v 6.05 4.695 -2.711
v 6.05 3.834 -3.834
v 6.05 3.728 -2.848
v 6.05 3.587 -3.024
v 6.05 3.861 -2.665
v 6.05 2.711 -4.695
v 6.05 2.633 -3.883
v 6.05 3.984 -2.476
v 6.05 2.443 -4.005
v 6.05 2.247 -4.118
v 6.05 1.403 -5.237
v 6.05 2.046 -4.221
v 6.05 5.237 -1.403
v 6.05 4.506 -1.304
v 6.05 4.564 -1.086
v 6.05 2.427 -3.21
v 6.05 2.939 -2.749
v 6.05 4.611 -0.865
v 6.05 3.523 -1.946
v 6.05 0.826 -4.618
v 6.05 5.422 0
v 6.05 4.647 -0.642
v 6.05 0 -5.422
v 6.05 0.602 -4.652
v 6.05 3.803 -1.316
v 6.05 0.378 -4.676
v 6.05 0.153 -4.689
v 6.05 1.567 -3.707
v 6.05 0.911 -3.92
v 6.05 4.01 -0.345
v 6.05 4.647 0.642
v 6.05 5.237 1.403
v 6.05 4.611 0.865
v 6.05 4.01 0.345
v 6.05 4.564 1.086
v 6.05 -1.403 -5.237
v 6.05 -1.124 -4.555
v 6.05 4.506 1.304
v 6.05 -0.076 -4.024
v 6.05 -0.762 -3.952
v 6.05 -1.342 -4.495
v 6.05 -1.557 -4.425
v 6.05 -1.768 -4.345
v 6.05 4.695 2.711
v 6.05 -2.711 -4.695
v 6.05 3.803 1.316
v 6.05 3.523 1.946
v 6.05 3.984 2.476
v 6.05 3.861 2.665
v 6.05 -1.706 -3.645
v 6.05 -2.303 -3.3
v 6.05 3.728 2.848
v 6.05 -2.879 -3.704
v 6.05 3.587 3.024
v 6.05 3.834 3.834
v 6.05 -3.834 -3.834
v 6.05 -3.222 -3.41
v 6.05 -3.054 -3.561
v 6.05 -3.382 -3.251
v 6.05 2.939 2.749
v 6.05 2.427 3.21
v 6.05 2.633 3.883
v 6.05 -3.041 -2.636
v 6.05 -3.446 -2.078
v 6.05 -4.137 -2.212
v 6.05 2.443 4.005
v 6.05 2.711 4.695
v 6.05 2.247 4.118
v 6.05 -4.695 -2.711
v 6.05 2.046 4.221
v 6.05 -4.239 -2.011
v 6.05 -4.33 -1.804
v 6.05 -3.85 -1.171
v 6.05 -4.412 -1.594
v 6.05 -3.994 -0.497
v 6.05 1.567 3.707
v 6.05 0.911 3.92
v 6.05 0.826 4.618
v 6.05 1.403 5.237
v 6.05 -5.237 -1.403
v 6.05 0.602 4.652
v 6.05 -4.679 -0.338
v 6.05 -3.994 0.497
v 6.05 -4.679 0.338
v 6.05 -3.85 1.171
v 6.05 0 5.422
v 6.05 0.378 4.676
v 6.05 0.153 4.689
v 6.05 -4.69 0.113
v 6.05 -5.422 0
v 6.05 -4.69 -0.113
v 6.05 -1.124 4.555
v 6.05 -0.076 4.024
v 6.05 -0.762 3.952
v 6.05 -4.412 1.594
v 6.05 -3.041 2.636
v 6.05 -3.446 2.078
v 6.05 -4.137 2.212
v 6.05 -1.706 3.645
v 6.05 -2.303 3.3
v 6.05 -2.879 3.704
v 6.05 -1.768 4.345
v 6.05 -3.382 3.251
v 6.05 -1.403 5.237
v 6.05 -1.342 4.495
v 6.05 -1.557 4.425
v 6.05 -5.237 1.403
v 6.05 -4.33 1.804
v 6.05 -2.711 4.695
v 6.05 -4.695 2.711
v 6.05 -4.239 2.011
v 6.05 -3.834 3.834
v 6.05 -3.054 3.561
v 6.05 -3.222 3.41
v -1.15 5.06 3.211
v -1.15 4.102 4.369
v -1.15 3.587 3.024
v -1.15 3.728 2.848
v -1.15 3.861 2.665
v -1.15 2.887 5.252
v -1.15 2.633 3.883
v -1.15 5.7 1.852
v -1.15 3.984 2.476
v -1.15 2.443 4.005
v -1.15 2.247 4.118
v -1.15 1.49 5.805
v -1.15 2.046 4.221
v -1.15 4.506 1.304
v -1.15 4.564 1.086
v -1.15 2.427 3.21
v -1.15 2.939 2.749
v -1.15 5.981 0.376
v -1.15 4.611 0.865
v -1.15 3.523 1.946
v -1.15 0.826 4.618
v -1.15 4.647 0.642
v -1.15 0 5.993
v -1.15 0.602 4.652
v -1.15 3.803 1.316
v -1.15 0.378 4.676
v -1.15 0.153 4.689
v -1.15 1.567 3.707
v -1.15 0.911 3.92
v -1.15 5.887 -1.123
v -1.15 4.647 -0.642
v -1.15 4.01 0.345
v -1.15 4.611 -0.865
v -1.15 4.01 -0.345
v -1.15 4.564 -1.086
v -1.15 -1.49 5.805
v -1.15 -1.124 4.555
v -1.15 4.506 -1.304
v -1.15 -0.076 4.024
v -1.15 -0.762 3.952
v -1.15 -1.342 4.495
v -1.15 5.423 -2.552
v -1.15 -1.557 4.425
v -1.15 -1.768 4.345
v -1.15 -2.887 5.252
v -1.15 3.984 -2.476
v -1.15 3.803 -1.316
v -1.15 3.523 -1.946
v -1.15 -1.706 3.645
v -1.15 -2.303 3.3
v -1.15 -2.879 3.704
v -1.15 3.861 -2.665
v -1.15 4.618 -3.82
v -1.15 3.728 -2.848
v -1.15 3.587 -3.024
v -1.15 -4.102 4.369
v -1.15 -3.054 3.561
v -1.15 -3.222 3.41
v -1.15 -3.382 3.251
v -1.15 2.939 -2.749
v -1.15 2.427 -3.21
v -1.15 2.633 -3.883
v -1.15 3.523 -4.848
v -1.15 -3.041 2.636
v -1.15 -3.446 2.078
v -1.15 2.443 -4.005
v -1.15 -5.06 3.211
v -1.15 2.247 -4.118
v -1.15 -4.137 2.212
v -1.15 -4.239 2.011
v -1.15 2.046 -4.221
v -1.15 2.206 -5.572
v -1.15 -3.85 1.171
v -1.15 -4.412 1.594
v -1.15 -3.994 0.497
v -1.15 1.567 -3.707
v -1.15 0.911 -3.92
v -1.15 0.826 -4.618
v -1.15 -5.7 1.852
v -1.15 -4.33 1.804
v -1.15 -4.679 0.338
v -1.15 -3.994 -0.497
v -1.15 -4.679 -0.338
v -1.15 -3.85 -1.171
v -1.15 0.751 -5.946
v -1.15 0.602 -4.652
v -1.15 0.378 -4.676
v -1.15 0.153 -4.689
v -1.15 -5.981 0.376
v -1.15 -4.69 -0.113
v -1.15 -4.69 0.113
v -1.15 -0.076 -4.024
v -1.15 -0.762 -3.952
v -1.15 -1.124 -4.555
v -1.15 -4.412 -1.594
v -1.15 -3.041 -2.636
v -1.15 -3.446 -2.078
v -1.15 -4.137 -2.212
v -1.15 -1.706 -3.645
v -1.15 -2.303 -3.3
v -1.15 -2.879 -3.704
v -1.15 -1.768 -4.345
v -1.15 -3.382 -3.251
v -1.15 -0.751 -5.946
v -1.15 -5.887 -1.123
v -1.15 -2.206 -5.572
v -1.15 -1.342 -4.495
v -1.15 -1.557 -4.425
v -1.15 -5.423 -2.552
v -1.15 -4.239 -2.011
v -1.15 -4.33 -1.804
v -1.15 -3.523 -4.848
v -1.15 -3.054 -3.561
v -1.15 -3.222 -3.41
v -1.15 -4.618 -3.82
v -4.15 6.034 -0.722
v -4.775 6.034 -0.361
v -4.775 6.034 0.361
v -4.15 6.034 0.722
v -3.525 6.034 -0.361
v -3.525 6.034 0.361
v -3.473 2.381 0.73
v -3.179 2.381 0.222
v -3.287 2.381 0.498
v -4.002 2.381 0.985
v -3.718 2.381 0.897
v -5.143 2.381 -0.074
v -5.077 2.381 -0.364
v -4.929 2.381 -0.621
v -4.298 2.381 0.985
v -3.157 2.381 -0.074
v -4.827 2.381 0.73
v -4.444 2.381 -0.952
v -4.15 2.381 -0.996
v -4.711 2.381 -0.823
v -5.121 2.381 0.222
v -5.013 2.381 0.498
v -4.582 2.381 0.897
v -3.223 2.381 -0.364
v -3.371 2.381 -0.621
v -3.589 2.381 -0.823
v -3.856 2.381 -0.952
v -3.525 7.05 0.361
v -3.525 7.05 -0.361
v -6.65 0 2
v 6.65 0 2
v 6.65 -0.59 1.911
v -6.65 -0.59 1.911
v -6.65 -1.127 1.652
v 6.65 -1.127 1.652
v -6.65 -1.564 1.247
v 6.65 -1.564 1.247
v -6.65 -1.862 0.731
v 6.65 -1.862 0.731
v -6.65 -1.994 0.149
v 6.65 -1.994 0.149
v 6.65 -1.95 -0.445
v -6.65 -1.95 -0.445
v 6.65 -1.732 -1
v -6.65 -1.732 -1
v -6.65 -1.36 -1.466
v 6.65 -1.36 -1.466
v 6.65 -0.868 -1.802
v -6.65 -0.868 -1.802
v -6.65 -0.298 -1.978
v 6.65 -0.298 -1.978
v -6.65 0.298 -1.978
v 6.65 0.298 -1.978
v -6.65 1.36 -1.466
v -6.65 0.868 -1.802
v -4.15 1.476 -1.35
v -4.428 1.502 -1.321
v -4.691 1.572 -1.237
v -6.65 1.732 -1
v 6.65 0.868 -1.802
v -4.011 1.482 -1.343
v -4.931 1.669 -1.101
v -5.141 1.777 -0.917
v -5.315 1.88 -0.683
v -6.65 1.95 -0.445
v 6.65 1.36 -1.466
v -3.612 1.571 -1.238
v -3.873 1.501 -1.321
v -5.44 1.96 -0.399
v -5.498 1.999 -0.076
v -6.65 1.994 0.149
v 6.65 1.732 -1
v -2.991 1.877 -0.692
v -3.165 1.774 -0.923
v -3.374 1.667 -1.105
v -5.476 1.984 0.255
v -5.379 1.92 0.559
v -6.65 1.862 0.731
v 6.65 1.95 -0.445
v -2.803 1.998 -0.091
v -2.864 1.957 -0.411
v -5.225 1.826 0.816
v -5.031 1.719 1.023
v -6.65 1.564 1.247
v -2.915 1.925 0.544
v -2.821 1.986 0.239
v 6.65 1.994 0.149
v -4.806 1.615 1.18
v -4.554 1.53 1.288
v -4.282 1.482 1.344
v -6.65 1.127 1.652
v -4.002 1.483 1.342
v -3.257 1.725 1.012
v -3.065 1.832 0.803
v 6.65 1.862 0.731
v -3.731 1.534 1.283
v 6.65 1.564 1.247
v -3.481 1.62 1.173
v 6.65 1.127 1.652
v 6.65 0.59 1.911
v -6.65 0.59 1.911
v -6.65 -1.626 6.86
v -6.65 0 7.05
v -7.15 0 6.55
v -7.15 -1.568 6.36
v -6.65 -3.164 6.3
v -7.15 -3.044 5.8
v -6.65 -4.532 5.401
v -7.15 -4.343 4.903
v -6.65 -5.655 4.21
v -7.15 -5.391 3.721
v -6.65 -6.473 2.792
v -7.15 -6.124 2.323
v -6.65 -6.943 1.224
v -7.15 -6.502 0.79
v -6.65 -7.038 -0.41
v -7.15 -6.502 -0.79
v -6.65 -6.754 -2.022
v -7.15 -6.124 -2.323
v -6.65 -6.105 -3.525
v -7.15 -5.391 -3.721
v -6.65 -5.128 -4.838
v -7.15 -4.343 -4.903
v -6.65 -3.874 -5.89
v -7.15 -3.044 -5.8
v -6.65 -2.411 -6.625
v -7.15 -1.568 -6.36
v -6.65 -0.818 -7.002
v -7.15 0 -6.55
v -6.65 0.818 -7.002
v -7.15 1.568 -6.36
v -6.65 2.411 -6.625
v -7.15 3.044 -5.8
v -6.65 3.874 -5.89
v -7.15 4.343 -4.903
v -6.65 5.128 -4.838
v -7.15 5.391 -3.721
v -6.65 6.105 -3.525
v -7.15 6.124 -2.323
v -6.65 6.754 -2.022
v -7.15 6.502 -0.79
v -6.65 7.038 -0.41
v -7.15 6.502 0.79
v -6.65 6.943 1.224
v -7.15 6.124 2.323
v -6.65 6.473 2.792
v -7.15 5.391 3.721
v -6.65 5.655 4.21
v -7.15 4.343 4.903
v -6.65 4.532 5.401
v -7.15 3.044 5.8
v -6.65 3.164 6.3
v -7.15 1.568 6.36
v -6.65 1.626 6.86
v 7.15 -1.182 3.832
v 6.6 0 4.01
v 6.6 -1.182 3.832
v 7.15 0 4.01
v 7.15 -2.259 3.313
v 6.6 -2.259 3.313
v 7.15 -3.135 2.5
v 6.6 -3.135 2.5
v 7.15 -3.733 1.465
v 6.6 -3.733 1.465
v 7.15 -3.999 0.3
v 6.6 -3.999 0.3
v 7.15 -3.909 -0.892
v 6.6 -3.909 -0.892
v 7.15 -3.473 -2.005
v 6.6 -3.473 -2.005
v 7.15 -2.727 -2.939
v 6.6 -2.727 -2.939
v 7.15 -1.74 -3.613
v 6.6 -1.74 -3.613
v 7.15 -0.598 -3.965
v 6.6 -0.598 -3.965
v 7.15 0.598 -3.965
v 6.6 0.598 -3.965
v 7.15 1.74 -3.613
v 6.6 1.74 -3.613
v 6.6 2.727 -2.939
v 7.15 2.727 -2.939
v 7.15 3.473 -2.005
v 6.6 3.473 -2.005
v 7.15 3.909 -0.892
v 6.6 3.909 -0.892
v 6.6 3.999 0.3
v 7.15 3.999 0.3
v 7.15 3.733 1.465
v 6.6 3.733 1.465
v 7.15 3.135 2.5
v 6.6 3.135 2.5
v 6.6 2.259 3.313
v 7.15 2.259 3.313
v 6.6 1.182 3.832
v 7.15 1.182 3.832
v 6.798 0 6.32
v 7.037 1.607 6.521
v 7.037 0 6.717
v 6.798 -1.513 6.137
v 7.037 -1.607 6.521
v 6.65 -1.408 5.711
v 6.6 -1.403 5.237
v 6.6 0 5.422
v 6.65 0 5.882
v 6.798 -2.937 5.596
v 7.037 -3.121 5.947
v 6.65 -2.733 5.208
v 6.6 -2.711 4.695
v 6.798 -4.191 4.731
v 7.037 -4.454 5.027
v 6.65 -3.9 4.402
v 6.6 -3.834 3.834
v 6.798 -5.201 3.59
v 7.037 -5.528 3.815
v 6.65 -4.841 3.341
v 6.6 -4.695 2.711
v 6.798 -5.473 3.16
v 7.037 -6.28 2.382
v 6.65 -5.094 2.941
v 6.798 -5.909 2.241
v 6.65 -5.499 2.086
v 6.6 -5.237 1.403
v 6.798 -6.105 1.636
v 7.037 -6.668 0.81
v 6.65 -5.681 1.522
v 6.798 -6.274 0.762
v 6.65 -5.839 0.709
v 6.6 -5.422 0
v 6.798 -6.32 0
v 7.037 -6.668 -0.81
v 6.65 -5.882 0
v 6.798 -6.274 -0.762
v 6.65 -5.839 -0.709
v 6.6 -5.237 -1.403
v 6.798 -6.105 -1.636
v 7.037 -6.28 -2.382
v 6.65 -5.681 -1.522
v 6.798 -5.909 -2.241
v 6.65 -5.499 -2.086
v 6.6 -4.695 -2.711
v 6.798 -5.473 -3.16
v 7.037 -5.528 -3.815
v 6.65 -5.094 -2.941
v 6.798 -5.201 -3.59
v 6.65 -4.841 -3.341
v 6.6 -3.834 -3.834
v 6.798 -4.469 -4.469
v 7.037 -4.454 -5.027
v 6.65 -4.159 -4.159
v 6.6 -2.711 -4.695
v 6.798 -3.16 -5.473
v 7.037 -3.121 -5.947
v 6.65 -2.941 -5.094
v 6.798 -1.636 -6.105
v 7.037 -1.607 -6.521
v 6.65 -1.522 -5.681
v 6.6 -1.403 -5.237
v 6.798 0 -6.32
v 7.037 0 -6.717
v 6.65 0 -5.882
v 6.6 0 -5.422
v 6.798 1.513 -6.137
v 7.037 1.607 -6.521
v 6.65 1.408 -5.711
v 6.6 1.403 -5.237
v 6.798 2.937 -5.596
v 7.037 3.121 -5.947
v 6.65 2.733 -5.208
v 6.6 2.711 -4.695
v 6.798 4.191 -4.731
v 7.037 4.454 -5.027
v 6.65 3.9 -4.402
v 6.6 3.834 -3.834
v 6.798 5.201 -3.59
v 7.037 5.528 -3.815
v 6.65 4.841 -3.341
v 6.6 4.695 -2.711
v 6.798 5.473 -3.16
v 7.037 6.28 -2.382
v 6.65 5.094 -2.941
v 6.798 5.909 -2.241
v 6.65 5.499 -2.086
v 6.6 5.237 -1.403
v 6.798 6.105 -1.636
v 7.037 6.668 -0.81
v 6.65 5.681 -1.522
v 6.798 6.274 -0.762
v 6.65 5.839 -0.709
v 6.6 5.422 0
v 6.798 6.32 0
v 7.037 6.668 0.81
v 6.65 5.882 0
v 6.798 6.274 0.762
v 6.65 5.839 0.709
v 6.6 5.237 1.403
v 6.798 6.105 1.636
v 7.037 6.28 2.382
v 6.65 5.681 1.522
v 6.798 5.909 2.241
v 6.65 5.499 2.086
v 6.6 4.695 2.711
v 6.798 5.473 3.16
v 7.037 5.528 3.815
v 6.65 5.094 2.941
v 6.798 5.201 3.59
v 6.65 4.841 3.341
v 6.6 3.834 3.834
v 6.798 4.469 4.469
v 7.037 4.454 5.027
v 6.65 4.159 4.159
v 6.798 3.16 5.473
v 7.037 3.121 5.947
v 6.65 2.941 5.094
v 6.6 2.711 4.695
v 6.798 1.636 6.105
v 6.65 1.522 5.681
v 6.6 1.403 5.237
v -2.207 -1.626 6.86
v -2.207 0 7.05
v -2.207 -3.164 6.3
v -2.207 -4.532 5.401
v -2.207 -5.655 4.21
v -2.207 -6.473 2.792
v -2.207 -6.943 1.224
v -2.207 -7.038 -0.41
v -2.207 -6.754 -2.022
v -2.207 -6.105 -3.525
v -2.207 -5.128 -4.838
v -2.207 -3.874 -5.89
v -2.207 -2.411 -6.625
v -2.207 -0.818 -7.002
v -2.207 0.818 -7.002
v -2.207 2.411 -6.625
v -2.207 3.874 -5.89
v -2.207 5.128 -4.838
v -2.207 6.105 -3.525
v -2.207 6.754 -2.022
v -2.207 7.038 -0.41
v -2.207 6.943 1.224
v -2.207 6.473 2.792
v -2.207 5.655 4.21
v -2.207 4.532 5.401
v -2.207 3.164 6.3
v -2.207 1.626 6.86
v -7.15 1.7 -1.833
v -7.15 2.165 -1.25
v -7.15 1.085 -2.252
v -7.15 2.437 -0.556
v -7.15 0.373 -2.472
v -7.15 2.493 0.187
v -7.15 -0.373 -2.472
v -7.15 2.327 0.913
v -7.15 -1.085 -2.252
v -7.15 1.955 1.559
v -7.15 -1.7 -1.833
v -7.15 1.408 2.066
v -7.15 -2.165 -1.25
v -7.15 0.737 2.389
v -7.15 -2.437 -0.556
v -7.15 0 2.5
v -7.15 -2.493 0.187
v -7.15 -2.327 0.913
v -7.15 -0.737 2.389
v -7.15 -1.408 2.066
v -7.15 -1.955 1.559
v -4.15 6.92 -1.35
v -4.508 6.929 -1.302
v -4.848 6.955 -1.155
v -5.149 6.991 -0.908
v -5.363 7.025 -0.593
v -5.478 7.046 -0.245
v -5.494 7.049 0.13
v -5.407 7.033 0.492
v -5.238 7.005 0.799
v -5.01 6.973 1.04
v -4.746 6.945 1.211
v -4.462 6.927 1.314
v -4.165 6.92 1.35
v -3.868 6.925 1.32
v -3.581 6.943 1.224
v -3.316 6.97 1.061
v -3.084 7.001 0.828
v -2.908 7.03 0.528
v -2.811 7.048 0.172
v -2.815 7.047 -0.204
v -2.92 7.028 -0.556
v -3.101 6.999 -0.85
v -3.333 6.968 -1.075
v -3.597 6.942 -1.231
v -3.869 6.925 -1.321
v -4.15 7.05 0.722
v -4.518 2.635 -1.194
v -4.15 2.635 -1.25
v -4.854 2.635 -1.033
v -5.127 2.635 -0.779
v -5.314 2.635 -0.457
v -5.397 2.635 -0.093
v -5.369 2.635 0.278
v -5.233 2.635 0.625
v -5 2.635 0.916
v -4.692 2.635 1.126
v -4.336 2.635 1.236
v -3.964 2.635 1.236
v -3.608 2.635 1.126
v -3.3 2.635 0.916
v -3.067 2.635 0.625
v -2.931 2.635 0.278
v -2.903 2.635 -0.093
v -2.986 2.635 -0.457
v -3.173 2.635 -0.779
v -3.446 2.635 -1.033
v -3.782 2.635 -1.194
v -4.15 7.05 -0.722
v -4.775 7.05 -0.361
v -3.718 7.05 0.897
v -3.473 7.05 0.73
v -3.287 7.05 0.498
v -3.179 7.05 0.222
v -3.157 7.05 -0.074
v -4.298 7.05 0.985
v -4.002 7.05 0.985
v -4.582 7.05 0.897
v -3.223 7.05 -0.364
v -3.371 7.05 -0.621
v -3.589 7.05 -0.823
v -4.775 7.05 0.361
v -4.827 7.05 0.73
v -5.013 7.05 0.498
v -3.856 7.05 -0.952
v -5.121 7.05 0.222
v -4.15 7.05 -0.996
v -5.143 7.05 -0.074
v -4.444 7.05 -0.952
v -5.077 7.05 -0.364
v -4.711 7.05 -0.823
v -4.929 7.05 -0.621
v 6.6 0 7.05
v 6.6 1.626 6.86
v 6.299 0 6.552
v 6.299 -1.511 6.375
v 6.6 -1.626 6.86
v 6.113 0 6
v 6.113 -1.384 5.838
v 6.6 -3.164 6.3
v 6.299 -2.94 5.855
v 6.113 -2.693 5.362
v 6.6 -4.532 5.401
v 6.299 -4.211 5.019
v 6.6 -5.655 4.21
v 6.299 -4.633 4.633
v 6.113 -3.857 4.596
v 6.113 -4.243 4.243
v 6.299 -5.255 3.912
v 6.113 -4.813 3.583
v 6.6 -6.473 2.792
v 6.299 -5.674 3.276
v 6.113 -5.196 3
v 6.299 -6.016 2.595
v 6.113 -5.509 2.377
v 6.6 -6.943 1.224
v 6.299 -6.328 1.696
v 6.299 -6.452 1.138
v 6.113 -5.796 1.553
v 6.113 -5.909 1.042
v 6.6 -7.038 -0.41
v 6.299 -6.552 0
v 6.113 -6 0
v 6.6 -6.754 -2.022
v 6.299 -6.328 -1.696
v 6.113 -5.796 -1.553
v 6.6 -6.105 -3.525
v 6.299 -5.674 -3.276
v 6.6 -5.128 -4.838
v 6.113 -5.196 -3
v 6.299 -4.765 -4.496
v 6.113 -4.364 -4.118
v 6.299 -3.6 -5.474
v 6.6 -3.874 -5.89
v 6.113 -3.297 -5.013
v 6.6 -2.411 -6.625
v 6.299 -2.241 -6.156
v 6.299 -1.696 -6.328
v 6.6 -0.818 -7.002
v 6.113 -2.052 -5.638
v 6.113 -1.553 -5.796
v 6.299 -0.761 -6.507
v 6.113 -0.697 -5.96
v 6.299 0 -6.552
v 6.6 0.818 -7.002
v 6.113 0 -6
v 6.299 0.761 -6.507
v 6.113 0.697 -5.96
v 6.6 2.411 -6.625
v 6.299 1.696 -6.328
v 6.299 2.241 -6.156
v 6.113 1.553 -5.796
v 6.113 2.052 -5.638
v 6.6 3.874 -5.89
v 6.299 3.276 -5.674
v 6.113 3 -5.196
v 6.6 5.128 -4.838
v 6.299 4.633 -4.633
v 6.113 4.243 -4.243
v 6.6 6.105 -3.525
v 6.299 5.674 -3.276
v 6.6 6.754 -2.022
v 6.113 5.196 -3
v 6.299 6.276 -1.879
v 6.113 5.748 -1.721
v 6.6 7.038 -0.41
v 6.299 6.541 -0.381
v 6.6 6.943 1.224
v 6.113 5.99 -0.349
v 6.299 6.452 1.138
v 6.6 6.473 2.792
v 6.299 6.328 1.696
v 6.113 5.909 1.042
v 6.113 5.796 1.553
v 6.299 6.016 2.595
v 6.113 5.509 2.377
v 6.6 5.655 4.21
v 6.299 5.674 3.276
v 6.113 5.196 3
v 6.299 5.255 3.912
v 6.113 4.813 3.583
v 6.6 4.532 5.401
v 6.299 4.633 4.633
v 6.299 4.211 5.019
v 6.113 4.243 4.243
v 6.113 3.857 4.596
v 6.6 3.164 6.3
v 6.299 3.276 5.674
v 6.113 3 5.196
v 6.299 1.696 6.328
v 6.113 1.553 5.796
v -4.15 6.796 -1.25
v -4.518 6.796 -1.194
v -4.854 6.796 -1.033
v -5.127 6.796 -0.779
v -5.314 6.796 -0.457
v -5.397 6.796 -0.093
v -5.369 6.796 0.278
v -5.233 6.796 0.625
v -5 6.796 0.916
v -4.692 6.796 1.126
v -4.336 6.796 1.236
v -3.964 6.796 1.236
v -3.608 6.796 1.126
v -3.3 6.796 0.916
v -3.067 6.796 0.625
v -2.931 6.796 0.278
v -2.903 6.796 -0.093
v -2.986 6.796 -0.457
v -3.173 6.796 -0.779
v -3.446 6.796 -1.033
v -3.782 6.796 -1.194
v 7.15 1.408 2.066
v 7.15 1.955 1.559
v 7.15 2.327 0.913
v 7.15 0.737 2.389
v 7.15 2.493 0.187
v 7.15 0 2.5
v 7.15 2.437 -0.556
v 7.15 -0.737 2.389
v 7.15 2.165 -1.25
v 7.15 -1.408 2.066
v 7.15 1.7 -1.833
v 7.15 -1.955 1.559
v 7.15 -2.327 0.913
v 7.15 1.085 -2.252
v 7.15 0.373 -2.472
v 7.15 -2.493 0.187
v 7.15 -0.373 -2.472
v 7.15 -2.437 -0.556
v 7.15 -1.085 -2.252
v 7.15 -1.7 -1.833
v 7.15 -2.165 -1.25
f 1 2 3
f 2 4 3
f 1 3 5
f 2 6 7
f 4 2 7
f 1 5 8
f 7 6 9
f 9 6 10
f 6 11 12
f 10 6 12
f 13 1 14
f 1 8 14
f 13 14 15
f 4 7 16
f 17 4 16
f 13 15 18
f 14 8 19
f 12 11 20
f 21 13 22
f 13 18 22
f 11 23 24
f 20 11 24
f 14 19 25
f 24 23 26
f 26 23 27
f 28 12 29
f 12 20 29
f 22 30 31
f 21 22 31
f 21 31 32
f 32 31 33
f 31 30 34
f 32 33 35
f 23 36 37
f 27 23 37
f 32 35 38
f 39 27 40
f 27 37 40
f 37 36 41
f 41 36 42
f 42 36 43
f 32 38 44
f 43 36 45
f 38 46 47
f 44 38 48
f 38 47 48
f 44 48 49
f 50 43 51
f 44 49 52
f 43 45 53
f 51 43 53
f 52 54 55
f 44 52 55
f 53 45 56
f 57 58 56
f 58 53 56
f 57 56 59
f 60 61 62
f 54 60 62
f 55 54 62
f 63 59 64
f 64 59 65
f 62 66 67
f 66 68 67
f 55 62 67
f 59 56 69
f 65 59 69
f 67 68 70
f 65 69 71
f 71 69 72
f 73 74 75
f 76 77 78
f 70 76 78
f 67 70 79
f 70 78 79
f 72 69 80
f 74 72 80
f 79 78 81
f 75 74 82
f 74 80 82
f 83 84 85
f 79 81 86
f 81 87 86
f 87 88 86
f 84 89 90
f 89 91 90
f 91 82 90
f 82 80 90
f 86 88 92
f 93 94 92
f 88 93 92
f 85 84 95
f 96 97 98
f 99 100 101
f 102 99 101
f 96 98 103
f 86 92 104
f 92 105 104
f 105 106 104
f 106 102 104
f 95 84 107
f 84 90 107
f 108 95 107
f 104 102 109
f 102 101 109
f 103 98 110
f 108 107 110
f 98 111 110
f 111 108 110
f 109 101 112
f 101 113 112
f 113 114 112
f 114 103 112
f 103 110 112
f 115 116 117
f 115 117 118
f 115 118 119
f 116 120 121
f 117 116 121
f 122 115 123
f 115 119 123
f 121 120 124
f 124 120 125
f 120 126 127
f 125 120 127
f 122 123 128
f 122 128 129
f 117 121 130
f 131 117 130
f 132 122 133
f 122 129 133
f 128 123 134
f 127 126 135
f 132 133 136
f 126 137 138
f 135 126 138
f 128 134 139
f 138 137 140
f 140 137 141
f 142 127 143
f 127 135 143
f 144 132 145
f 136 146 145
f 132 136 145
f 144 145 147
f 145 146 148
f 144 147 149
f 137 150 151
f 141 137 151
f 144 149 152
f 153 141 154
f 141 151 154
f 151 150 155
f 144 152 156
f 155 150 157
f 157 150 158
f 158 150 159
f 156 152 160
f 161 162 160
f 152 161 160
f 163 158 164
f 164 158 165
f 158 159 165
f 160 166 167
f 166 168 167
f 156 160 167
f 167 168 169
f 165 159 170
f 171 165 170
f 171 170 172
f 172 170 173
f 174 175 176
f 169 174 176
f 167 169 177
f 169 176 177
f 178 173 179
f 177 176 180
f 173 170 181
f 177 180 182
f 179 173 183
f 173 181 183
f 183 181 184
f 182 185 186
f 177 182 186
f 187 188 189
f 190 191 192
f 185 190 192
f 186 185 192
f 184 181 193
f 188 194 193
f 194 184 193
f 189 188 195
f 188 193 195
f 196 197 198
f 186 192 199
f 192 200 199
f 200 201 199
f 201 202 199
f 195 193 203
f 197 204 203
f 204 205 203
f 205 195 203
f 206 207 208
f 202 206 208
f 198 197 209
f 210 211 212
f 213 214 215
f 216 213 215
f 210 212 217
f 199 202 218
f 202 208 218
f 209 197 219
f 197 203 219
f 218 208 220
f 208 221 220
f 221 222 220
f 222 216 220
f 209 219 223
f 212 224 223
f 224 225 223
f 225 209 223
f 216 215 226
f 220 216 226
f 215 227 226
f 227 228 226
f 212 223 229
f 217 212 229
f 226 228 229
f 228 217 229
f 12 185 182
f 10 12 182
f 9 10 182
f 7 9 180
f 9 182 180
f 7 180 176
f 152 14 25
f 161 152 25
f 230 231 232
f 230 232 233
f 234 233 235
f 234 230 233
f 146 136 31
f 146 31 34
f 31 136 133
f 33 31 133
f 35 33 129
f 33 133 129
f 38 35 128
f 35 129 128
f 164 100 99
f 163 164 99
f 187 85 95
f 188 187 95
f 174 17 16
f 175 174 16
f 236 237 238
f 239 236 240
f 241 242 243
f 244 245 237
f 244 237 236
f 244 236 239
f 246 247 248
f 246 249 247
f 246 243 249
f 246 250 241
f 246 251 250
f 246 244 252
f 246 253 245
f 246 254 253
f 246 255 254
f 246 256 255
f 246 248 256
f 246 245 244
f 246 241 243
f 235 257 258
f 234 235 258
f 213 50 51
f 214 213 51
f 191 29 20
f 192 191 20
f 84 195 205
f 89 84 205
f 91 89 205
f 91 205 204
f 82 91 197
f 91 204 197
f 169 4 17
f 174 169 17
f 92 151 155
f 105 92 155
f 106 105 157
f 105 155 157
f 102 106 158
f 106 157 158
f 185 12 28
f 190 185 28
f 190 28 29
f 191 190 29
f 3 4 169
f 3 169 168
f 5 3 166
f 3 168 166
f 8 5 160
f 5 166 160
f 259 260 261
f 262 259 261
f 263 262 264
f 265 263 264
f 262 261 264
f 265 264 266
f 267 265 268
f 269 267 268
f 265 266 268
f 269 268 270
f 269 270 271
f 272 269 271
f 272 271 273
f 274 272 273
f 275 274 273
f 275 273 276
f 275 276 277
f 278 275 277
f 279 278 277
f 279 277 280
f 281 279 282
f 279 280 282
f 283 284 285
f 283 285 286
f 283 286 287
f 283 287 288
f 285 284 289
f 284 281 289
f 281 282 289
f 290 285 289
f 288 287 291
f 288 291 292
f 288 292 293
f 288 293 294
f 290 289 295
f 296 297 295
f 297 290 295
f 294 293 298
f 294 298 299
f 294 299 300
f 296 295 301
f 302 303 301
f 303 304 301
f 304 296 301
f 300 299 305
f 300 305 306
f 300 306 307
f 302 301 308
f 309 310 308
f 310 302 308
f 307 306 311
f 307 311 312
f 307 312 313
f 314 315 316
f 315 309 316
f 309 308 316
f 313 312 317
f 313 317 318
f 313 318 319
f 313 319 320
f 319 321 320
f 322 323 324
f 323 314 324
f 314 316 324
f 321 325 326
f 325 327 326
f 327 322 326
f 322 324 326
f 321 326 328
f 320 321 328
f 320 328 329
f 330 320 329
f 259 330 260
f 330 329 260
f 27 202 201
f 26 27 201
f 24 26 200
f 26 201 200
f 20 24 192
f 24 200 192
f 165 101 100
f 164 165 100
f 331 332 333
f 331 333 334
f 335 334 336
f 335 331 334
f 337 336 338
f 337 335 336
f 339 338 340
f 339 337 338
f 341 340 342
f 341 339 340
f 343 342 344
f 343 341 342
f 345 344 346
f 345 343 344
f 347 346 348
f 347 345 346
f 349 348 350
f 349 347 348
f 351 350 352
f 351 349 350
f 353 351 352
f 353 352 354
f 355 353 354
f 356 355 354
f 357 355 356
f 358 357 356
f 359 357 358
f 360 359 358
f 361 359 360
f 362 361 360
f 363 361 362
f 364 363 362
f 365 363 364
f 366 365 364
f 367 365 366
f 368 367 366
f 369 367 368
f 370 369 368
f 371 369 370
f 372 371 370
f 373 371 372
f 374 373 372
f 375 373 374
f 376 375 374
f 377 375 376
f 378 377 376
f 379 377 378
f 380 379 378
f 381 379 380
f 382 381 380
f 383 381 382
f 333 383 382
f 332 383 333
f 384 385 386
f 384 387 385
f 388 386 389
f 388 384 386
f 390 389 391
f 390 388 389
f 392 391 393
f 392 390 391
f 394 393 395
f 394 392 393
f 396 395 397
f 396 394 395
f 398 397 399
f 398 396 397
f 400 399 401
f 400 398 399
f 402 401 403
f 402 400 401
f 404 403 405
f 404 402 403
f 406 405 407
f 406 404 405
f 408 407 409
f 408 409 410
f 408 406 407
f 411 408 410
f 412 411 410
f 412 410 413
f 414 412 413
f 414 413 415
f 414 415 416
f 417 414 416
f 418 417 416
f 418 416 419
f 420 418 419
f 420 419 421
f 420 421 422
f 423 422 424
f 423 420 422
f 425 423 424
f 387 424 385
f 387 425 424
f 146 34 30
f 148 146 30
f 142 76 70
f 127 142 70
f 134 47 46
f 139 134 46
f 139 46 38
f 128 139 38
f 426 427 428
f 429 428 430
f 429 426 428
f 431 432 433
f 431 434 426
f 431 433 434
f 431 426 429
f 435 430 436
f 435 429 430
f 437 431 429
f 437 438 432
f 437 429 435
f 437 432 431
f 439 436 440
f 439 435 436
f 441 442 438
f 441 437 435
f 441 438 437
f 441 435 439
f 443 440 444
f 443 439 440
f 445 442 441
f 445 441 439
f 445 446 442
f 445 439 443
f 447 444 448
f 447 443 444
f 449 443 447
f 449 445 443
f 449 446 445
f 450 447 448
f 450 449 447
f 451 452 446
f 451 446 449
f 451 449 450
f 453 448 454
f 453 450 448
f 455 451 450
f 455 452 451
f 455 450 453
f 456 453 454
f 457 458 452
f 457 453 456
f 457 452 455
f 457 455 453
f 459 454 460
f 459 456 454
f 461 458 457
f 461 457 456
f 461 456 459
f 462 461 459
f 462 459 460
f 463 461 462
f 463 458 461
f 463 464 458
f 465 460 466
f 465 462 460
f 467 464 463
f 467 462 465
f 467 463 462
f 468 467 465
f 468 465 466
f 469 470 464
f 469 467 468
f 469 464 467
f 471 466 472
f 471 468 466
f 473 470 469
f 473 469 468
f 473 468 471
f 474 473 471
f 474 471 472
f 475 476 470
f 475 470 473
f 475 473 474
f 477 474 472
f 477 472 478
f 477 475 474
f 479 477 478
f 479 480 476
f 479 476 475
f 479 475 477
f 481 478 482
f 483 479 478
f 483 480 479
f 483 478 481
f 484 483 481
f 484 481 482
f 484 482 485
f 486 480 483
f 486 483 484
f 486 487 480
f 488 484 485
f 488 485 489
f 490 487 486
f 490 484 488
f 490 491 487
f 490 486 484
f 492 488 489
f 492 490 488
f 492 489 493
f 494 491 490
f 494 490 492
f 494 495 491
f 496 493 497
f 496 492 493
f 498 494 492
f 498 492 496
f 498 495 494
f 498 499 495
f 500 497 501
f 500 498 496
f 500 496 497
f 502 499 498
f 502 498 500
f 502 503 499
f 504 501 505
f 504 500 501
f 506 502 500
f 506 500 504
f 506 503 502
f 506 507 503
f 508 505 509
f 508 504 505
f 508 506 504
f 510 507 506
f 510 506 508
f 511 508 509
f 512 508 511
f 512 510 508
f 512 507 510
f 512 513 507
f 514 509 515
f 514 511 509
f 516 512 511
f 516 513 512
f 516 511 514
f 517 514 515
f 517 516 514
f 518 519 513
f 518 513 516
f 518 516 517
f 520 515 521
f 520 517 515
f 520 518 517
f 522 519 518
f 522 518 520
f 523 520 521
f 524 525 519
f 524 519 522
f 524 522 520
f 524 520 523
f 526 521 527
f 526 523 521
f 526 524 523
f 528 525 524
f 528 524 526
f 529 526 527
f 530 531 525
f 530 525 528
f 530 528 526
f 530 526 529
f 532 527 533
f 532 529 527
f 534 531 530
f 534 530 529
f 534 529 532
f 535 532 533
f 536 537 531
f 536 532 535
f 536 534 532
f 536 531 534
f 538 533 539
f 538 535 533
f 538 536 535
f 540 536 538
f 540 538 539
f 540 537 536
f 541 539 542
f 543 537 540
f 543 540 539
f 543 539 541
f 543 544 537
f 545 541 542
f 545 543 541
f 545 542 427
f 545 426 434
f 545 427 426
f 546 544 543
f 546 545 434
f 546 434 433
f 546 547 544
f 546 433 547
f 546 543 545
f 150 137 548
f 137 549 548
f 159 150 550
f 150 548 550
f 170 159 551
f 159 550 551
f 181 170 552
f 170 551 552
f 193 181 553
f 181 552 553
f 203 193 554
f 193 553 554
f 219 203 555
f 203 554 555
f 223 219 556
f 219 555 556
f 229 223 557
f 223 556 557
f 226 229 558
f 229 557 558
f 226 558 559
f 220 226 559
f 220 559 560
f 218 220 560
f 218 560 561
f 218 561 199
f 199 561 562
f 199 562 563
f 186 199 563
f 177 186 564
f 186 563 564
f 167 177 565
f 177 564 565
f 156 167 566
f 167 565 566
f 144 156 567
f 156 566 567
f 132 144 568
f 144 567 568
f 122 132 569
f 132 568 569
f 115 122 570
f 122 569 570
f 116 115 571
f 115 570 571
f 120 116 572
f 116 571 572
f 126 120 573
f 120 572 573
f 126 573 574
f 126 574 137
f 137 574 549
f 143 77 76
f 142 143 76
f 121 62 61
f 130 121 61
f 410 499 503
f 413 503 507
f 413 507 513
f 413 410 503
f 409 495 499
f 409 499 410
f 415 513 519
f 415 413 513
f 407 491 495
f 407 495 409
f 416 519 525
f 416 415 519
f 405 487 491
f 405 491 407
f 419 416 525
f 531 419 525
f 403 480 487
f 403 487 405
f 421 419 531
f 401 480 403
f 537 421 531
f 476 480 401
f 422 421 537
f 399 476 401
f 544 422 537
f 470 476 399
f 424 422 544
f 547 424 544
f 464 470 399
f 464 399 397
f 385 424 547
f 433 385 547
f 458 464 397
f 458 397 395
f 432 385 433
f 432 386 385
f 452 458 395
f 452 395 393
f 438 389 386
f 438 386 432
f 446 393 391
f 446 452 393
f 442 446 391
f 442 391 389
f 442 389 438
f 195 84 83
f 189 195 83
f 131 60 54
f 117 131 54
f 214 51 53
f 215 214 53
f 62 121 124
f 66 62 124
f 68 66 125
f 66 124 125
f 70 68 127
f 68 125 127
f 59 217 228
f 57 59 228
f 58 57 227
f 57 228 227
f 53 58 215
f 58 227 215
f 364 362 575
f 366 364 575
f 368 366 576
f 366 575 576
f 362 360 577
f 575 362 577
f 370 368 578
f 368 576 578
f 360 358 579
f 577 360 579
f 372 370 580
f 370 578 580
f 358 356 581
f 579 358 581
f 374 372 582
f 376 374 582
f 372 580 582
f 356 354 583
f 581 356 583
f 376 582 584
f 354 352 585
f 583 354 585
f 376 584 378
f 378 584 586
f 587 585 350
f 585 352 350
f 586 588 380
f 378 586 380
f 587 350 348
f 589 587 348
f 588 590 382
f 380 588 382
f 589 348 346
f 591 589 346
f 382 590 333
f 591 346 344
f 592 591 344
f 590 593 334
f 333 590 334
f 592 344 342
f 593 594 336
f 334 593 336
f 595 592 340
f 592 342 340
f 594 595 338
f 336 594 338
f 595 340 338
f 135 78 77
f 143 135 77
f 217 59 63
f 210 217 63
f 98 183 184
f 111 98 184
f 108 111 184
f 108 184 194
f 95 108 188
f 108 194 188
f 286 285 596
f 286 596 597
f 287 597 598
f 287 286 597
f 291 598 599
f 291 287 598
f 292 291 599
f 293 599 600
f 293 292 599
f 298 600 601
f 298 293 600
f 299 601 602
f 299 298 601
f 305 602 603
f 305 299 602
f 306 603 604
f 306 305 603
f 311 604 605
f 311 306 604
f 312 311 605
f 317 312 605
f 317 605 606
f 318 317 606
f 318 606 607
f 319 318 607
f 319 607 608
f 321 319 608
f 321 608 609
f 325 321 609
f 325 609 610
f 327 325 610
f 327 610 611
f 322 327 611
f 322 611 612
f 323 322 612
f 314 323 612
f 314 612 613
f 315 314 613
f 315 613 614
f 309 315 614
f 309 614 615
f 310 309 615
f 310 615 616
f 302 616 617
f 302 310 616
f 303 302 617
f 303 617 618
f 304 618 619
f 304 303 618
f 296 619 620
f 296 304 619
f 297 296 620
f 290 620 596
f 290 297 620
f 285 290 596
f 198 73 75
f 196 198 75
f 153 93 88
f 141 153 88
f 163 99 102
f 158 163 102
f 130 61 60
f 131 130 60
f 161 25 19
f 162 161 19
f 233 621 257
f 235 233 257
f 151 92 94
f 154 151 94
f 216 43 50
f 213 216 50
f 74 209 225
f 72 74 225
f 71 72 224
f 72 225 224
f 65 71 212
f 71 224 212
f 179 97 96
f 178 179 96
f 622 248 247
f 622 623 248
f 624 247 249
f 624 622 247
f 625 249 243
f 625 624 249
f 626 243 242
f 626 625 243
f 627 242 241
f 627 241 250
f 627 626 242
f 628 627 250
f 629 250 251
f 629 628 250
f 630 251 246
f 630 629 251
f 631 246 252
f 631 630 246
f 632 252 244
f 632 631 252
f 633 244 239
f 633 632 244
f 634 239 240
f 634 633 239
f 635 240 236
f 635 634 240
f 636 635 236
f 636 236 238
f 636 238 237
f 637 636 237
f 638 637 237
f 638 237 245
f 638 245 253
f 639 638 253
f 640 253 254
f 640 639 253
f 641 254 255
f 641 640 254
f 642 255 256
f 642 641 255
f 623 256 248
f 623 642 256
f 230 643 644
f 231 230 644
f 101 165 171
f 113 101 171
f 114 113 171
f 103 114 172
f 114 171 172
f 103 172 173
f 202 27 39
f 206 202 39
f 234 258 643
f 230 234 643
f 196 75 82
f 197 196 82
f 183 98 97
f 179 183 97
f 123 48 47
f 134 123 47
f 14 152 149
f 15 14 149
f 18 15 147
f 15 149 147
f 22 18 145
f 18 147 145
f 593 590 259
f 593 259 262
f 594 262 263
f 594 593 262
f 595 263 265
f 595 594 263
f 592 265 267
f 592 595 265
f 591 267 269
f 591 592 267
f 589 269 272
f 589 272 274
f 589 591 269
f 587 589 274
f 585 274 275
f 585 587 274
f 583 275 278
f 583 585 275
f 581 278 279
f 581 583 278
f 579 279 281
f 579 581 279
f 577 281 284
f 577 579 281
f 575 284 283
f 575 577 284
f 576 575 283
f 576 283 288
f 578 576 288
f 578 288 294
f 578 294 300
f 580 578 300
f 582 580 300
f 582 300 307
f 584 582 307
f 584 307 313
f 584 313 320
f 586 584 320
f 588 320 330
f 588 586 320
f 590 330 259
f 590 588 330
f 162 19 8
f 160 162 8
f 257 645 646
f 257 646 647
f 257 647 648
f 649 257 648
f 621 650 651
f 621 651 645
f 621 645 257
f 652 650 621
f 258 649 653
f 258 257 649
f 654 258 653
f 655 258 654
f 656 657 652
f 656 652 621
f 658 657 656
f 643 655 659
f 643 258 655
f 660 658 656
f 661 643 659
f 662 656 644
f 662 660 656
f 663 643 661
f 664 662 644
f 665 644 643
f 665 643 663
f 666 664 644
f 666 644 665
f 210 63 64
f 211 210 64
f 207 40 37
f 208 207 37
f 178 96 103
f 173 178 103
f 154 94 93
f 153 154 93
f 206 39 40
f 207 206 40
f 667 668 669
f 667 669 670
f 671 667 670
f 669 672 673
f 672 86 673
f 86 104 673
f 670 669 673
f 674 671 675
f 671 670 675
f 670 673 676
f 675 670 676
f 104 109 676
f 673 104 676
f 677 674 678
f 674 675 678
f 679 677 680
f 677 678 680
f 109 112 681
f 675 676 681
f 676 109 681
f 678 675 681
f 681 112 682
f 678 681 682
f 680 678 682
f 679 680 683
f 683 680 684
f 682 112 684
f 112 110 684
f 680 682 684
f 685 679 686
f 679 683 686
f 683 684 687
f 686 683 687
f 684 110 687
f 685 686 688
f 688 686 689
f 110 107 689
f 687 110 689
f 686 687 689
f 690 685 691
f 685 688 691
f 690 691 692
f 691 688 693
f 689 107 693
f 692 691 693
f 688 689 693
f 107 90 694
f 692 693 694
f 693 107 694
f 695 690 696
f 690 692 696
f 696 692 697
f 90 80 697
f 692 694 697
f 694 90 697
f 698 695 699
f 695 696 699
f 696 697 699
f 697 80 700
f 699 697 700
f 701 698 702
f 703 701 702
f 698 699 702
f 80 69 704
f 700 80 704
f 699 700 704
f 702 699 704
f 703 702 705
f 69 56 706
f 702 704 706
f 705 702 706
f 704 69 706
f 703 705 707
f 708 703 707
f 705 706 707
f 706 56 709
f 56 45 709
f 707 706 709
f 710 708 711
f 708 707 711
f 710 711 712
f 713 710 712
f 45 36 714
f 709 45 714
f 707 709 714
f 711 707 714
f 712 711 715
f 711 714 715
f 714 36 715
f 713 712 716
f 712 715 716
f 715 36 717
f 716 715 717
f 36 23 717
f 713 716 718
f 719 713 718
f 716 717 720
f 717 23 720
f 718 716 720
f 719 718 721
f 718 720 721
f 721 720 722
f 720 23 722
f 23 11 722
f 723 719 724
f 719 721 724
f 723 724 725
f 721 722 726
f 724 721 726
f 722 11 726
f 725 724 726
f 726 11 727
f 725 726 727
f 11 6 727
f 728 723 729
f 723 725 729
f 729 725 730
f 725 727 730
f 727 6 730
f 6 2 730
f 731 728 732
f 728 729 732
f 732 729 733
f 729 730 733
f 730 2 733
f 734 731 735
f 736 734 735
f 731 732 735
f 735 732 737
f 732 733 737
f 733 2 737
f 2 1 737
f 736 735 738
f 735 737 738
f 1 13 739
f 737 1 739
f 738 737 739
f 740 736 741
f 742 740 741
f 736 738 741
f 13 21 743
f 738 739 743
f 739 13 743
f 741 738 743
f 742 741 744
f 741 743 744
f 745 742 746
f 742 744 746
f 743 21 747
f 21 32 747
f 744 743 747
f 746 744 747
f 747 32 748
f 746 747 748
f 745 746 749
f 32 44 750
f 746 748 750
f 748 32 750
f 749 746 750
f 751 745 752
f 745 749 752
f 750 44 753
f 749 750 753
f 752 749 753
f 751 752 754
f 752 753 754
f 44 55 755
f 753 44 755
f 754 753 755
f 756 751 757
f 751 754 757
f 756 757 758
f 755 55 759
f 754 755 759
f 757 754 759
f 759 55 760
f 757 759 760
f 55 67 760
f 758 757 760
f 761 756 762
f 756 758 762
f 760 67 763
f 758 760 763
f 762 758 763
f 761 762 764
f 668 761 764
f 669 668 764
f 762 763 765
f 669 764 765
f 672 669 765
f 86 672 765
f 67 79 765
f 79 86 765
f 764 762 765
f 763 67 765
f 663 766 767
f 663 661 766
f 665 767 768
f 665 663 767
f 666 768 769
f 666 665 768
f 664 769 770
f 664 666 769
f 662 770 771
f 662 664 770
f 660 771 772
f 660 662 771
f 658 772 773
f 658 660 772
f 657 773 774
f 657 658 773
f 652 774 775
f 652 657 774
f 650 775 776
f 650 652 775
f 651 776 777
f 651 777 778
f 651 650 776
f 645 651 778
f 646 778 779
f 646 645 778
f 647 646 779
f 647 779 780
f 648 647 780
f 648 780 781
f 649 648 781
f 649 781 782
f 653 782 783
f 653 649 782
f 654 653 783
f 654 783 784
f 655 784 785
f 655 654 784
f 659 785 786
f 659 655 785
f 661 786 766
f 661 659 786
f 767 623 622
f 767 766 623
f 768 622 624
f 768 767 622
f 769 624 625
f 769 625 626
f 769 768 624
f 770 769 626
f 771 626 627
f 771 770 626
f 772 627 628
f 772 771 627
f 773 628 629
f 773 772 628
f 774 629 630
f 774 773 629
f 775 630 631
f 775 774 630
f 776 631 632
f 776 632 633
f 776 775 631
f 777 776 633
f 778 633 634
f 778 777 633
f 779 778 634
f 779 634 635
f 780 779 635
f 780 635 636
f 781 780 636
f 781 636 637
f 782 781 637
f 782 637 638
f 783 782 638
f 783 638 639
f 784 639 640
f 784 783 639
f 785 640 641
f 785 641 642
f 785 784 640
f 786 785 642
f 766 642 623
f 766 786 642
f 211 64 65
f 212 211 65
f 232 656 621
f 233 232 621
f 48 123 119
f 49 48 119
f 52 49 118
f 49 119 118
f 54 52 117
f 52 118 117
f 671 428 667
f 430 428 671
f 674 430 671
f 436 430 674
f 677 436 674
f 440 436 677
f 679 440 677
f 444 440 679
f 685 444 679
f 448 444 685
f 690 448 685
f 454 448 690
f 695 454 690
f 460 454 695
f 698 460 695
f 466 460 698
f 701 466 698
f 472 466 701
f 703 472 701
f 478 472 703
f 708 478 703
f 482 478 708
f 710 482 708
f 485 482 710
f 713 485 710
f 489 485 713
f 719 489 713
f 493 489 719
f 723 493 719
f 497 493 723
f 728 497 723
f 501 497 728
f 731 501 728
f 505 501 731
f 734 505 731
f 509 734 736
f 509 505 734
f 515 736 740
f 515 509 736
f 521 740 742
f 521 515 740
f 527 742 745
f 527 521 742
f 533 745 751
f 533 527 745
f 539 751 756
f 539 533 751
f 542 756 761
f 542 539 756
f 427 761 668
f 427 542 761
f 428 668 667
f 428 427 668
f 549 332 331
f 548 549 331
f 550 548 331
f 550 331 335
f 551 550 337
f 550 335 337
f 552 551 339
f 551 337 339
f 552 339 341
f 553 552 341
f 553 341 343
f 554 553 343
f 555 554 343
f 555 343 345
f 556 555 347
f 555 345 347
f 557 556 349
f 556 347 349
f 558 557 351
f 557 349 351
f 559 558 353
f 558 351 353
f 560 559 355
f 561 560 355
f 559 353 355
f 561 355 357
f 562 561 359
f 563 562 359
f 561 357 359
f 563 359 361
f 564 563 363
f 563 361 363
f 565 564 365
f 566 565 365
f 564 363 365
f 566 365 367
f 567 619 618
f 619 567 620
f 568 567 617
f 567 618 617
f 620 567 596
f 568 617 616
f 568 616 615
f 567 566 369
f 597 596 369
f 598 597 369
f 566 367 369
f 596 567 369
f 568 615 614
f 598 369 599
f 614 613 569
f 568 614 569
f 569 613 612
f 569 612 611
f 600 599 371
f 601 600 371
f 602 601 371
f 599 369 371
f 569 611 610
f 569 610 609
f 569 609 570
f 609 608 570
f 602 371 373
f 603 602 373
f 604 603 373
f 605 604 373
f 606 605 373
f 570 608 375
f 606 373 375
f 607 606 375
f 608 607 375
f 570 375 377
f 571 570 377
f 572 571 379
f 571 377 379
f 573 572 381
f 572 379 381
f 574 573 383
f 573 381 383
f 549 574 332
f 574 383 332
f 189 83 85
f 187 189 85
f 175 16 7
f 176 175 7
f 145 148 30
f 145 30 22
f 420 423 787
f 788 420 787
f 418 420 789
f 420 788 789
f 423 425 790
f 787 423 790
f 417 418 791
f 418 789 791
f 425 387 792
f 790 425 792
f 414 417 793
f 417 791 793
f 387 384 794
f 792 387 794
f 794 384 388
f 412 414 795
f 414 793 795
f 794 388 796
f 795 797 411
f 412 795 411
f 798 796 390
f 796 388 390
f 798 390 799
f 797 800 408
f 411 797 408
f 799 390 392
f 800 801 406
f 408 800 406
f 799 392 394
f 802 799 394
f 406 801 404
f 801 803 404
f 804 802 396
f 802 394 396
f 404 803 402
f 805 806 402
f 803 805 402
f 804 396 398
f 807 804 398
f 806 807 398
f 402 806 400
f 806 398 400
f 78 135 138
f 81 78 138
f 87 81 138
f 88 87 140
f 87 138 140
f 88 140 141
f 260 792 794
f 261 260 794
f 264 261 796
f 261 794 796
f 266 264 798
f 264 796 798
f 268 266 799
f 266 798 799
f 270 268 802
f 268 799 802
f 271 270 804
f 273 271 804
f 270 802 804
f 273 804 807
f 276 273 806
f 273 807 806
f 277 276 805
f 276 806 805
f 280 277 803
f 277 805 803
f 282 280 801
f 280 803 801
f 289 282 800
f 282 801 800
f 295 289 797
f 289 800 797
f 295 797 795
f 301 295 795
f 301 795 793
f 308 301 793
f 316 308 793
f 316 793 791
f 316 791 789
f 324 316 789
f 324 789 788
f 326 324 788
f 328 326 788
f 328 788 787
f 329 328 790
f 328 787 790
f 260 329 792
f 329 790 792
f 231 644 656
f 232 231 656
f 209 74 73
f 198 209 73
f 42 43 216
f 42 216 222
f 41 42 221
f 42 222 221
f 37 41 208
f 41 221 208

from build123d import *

# Parameters (mm, degrees)
SKETCH4_R          = 4.85
SKETCH4_R_2        = 4.69125
CUT_EXTRUDE2_DEPTH = 7.2
CUT_EXTRUDE1_DEPTH = 7.2
CIRPATTERN1_COUNT  = 15
SKETCH6_R          = 1.35
CUT_EXTRUDE3_DEPTH = 13.268964912
CUT_EXTRUDE4_DEPTH = 1.016
CHAMFER1_SIZE      = 0.5


with BuildPart() as part:
    # Sketch1 → Revolve1 (revolve)
    with BuildSketch(Plane.XY, mode=Mode.PRIVATE) as revolve1_sk:
        with BuildLine():
            Line((-7.15, 2), (7.15, 2))
            Line((7.15, 2), (7.15, 7.05))
            Line((7.15, 7.05), (6.6, 7.05))
            ThreePointArc((6.6, 7.05), (6.191212109, 6.280934734), (6.05, 5.4215))
            Line((6.05, 5.4215), (6.05, 4.85))
            Line((6.05, 4.85), (-1.15, 4.85))
            Line((-1.15, 4.85), (-1.15, 5.993))
            Line((-1.15, 5.993), (-2.207, 7.05))
            Line((-2.207, 7.05), (-7.15, 7.05))
            Line((-7.15, 7.05), (-7.15, 2))
        make_face()
    revolve(revolve1_sk.sketch.rotate(Axis((-7.15, 0, 0), (1, 0, 0)), 90), axis=Axis((-7.15, 0, 0), (1, 0, 0)))

    # Sketch4 → Cut-Extrude2 (cut)
    with BuildSketch(Plane(origin=(-1.15, 0, 0), x_dir=(0, 0, -1), z_dir=(1, 0, 0))):
        Circle(SKETCH4_R)
        Circle(SKETCH4_R_2, mode=Mode.SUBTRACT)
    extrude(amount=CUT_EXTRUDE2_DEPTH, mode=Mode.SUBTRACT)

    # Sketch3 → Cut-Extrude1 (cut)
    with BuildSketch(Plane(origin=(-1.15, 0, 0), x_dir=(0, 0, -1), z_dir=(1, 0, 0))):
        with BuildLine():
            Line((-0.641824768, 4.647137563), (-0.344592193, 4.009720248))
            Line((-0.344592193, 4.009720248), (0.344592193, 4.009720248))
            Line((0.344592193, 4.009720248), (0.641824768, 4.647137563))
            ThreePointArc((0.641824768, 4.647137563), (0, 4.69125), (-0.641824768, 4.647137563))
        make_face()
    cut_extrude1 = extrude(amount=CUT_EXTRUDE1_DEPTH, mode=Mode.SUBTRACT)

    # CirPattern1: Cut-Extrude1 ×15 about axis
    cirpattern1_axis = Axis((0, 0, 0), (1, 0, 0))
    for i in range(1, CIRPATTERN1_COUNT):
        add(cut_extrude1.rotate(cirpattern1_axis, i * 360 / CIRPATTERN1_COUNT), mode=Mode.SUBTRACT)

    # Sketch6 → Cut-Extrude3 (cut, through all)
    with BuildSketch(Plane(origin=(0, 0, 0), x_dir=(1, 0, 0), z_dir=(0, 1, 0))):
        with Locations(Location((-4.15, 0, 0), (0, 0, 90))):
            Circle(SKETCH6_R)
    extrude(amount=CUT_EXTRUDE3_DEPTH, mode=Mode.SUBTRACT)

    # Chamfer1
    chamfer1_edges = [part.edges().sort_by_distance(p)[0] for p in [
        (-7.15, 0, -7.05),
        (-7.15, 0, -2),
        (7.15, 0, -2),
    ]]
    chamfer(chamfer1_edges, length=CHAMFER1_SIZE)

    # Sketch9 → Cut-Revolve1 (revolve, cut)
    with BuildSketch(Plane.XY, mode=Mode.PRIVATE) as cut_revolve1_sk:
        with BuildLine():
            Line((7.15, 4.009720248), (7.15, 7.05))
            Line((7.15, 7.05), (6.802186426, 7.315185187))
            Line((6.802186426, 7.315185187), (6.6, 7.05))
            Line((6.6, 7.05), (7.037375657, 6.71652956))
            ThreePointArc((7.037375657, 6.71652956), (6.712295889, 6.104946967), (6.6, 5.4215))
            Line((6.6, 5.4215), (6.6, 4.009720248))
            Line((6.6, 4.009720248), (7.15, 4.009720248))
        make_face()
    revolve(cut_revolve1_sk.sketch.rotate(Axis((-7.15, 0, 0), (1, 0, 0)), 90), axis=Axis((-7.15, 0, 0), (1, 0, 0)), mode=Mode.SUBTRACT)


with BuildPart() as body_2:
    # Sketch7 → Revolve2 (revolve)
    with BuildSketch(Plane.XY, mode=Mode.PRIVATE) as revolve2_sk:
        Polygon((-5.146, 7.05), (-4.15, 7.05), (-4.15, 2.381), (-5.146, 2.381), (-5.4, 2.635), (-5.4, 6.796), align=None)
    revolve(revolve2_sk.sketch.rotate(Axis((-4.15, 2.381, 0), (0, 1, 0)), 270), axis=Axis((-4.15, 2.381, 0), (0, 1, 0)))

    # Sketch8 → Cut-Extrude4 (cut)
    with BuildSketch(Plane(origin=(0, 7.05, 0), x_dir=(1, 0, 0), z_dir=(0, 1, 0))):
        Polygon((-4.15, 0.721687836), (-4.775, 0.360843918), (-4.775, -0.360843918), (-4.15, -0.721687836), (-3.525, -0.360843918), (-3.525, 0.360843918), align=None)
    extrude(amount=-CUT_EXTRUDE4_DEPTH, mode=Mode.SUBTRACT)


solid = Compound([part.part, body_2.part])
